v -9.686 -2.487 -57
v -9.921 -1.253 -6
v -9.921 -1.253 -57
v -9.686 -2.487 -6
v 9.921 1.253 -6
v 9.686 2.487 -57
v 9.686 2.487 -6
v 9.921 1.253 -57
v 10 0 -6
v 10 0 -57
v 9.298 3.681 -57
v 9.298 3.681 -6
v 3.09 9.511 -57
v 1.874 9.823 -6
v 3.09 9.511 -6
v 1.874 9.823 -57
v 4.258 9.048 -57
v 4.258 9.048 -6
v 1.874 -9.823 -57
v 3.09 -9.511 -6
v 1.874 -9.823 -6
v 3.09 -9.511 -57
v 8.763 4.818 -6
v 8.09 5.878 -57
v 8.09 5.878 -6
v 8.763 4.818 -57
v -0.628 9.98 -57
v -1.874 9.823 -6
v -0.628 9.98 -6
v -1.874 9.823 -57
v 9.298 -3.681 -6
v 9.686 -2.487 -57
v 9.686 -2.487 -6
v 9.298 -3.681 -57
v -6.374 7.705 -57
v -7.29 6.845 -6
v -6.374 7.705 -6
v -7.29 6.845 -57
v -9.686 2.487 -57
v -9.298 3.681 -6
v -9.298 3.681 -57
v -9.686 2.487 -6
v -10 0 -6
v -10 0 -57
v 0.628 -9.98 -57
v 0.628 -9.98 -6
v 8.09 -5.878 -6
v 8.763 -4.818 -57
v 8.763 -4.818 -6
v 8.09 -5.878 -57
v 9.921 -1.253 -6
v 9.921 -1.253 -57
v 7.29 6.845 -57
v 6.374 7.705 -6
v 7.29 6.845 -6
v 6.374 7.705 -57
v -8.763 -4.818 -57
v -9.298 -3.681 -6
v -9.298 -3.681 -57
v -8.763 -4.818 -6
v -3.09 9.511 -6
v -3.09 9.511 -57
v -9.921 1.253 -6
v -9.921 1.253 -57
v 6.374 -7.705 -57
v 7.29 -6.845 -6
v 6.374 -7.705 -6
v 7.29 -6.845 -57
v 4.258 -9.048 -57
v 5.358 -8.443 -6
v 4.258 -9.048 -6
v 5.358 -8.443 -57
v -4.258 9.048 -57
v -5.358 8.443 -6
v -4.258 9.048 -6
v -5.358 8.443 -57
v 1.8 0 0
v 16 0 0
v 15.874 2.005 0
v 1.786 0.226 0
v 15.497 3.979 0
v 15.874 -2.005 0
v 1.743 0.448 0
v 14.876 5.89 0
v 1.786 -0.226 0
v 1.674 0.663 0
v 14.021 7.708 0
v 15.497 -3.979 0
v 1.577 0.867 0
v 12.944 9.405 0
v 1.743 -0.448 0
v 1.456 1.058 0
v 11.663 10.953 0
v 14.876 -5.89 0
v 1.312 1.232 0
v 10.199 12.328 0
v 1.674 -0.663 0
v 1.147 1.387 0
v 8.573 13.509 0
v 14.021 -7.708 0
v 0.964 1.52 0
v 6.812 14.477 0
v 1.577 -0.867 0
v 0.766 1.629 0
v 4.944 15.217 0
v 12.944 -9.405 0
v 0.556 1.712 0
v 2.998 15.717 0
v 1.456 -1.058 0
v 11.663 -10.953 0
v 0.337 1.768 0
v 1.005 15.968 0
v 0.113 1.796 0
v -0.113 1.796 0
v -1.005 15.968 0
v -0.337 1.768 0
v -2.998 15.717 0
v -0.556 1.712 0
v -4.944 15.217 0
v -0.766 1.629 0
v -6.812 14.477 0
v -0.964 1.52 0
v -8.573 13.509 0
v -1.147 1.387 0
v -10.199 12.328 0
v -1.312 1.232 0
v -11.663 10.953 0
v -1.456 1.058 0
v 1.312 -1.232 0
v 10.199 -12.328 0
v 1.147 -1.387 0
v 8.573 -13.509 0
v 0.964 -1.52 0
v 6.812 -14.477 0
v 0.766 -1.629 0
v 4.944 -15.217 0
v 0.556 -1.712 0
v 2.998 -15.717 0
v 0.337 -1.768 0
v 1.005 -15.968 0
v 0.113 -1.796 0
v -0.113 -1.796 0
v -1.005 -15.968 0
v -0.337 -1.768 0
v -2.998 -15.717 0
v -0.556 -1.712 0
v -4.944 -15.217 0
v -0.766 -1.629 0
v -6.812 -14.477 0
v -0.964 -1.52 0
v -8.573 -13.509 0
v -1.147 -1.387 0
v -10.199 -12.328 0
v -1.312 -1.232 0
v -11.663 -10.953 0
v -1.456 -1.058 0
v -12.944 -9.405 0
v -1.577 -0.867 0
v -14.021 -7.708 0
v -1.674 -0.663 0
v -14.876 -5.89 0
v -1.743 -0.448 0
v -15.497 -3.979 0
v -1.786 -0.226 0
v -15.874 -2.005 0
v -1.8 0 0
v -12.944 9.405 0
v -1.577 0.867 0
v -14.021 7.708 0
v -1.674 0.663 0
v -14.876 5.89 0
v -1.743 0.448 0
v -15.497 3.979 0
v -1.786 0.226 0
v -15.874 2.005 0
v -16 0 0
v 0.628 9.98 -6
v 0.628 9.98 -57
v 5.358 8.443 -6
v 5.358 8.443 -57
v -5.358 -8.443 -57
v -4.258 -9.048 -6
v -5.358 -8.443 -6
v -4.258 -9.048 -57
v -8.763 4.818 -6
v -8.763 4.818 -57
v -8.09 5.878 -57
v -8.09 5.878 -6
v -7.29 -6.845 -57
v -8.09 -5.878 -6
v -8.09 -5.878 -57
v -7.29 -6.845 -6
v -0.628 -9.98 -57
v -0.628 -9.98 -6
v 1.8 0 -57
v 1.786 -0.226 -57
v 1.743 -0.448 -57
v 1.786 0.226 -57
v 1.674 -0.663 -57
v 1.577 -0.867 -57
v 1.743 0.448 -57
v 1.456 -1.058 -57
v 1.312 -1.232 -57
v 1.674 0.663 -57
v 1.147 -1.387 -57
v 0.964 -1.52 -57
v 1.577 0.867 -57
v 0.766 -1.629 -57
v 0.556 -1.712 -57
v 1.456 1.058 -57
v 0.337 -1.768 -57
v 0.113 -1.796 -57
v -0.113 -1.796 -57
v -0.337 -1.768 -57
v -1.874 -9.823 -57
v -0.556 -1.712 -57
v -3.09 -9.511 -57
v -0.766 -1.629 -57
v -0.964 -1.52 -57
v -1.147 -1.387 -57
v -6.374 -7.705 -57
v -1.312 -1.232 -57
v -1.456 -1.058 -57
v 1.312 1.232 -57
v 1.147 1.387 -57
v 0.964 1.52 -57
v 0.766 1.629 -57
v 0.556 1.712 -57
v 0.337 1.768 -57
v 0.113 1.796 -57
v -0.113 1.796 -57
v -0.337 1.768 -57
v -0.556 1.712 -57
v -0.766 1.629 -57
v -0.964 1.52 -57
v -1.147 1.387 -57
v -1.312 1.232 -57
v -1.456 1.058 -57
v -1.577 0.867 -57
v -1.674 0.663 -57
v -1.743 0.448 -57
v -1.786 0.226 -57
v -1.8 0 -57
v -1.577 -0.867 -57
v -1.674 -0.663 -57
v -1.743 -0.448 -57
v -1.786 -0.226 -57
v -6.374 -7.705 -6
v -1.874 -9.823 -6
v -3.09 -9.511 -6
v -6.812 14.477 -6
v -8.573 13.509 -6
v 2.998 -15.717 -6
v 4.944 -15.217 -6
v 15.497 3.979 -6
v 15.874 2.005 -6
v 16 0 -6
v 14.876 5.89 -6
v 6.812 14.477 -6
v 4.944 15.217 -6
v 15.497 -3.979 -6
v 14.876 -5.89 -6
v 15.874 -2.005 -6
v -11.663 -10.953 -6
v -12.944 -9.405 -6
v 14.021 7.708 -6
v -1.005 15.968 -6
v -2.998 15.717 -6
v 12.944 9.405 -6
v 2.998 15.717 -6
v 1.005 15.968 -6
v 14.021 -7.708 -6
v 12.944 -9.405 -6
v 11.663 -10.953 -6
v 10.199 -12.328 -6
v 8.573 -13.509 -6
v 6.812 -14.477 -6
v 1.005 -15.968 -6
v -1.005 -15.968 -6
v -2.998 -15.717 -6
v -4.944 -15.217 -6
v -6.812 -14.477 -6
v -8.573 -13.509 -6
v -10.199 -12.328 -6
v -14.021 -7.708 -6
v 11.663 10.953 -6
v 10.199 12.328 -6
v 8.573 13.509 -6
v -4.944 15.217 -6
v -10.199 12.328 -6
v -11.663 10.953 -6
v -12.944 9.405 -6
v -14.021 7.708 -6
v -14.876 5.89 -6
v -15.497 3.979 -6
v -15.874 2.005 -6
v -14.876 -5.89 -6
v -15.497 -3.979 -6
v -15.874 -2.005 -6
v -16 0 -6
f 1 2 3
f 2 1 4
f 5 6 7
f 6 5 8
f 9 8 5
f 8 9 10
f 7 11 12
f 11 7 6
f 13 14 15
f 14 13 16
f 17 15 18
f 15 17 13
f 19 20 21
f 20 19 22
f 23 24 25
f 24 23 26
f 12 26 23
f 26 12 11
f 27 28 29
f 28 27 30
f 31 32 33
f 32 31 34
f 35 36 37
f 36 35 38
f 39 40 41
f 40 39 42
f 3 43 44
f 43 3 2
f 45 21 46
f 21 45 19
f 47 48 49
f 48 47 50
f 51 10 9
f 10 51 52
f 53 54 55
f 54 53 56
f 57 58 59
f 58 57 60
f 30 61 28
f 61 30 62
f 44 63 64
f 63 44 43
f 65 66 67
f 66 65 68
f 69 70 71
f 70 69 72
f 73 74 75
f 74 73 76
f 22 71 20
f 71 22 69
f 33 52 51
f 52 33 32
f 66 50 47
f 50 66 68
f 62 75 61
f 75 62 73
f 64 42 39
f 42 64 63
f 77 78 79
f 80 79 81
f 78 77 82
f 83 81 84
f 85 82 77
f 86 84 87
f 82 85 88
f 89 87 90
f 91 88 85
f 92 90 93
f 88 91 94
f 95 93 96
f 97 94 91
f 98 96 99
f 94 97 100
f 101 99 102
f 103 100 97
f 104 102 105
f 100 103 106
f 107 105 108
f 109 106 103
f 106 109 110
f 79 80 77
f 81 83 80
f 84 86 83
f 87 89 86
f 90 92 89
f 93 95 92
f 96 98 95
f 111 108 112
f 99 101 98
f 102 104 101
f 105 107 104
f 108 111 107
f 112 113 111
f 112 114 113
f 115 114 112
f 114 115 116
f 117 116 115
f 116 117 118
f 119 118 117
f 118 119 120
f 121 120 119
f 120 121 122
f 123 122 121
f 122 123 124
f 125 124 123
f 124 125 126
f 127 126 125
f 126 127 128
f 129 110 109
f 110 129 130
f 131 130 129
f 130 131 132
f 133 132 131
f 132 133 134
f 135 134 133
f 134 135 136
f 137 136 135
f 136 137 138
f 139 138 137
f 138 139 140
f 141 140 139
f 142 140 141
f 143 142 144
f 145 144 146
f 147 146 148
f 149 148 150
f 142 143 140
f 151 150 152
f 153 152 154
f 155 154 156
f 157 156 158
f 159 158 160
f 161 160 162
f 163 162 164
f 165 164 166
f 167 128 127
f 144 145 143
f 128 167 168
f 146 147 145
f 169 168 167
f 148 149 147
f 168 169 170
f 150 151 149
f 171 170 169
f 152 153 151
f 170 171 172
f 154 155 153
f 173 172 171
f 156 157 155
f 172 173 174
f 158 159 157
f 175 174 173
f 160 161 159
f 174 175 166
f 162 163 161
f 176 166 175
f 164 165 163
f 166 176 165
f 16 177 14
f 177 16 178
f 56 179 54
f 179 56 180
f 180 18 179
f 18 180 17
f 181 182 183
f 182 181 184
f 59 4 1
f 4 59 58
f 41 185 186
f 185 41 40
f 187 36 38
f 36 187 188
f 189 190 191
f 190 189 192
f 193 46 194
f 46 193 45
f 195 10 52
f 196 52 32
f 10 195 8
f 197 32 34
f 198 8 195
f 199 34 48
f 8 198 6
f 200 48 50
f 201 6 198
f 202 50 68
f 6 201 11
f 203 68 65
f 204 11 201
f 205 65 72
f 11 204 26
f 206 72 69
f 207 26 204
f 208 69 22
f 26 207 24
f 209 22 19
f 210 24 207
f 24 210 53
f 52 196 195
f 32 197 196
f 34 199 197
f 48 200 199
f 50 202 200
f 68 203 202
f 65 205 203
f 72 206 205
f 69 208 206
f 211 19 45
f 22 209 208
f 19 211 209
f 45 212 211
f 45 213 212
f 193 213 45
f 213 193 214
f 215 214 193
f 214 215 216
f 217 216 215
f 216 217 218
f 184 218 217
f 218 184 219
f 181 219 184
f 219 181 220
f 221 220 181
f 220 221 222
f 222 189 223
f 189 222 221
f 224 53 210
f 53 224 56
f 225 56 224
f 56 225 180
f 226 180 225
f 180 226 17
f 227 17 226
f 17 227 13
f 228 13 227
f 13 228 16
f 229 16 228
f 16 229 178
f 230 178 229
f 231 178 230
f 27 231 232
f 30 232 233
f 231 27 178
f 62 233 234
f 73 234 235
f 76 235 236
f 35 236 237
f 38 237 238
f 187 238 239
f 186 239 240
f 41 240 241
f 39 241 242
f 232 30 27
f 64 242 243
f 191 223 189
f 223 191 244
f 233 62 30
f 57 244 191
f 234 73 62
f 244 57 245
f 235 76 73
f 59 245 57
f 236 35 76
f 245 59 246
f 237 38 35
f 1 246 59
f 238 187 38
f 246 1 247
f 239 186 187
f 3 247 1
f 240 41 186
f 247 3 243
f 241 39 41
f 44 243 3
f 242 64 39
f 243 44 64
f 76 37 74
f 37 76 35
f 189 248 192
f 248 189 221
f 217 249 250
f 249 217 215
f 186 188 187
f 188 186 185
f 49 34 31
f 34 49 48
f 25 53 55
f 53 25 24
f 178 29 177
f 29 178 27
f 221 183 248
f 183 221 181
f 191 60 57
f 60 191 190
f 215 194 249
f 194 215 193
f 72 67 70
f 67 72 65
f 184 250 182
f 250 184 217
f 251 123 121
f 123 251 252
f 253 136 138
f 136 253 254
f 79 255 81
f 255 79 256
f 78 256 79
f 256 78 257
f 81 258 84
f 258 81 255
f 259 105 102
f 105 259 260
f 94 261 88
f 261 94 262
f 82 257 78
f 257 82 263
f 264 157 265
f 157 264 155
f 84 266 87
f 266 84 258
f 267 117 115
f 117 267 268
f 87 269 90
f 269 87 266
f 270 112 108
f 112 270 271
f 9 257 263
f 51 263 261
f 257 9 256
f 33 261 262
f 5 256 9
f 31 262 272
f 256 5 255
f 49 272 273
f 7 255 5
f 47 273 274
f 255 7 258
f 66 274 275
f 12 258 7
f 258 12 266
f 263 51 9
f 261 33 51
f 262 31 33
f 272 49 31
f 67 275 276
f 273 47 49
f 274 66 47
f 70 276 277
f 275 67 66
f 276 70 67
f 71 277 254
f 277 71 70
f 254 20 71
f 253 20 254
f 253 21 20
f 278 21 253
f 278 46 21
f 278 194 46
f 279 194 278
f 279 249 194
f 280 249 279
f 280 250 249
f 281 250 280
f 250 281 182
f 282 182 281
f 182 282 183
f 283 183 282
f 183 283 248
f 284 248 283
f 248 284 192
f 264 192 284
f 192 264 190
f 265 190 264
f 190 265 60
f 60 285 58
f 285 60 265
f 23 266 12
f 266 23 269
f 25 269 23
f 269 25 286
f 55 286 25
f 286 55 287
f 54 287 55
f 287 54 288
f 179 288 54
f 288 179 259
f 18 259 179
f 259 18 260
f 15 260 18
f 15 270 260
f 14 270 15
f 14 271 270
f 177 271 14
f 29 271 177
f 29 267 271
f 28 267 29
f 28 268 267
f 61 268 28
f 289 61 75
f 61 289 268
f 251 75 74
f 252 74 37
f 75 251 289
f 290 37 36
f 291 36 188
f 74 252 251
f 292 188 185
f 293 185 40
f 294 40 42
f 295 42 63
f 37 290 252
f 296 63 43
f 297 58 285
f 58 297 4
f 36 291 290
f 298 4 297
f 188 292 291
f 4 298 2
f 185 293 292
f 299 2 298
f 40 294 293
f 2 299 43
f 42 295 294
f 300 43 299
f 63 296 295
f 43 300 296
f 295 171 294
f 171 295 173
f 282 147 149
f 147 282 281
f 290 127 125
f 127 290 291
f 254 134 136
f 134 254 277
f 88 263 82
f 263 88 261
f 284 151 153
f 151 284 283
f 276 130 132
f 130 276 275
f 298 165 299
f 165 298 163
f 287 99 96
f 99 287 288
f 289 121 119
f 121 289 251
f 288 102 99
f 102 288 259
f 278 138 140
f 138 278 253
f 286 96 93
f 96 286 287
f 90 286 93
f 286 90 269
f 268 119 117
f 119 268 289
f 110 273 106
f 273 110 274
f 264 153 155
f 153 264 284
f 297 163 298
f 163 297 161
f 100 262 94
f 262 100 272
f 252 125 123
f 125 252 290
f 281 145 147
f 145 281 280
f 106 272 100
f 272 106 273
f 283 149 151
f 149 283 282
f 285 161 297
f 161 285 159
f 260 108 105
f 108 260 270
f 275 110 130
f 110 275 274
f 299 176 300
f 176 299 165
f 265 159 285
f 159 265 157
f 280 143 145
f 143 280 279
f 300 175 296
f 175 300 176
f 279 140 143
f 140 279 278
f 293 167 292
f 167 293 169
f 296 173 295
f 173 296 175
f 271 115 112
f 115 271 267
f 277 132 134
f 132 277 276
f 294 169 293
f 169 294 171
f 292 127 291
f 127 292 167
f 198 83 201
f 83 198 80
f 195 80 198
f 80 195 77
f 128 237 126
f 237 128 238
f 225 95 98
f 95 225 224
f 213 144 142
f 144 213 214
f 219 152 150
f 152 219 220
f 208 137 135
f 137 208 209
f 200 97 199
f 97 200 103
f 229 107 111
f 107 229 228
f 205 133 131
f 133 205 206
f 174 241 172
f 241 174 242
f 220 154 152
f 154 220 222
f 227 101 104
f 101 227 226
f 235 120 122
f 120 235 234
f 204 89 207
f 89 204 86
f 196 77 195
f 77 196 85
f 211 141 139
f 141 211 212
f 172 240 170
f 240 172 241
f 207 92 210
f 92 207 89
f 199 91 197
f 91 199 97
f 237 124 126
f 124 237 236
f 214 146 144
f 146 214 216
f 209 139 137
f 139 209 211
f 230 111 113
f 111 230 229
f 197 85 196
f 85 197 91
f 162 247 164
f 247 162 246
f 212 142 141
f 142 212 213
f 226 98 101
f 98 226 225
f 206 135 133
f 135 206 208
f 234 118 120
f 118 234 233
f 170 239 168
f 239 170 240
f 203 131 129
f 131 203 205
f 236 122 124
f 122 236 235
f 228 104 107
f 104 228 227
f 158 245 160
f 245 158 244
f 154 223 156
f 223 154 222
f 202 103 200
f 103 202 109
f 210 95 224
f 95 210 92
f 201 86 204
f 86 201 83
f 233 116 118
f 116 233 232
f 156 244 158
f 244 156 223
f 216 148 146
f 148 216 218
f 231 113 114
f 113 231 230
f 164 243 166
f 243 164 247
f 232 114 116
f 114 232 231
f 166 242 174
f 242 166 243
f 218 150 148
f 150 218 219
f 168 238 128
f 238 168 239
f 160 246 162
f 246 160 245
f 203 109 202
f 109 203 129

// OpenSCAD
$fn = 50;


difference() {
	union() {
		translate(v = [0, 0, -57.0000000000]) {
			cylinder(h = 57, r = 10.0000000000);
		}
		translate(v = [0, 0, -6.0000000000]) {
			cylinder(h = 6, r = 16.0000000000);
		}
	}
	union() {
		#translate(v = [0, 0, -57]) {
			cylinder(h = 57, r = 1.8000000000);
		}
	}
}
